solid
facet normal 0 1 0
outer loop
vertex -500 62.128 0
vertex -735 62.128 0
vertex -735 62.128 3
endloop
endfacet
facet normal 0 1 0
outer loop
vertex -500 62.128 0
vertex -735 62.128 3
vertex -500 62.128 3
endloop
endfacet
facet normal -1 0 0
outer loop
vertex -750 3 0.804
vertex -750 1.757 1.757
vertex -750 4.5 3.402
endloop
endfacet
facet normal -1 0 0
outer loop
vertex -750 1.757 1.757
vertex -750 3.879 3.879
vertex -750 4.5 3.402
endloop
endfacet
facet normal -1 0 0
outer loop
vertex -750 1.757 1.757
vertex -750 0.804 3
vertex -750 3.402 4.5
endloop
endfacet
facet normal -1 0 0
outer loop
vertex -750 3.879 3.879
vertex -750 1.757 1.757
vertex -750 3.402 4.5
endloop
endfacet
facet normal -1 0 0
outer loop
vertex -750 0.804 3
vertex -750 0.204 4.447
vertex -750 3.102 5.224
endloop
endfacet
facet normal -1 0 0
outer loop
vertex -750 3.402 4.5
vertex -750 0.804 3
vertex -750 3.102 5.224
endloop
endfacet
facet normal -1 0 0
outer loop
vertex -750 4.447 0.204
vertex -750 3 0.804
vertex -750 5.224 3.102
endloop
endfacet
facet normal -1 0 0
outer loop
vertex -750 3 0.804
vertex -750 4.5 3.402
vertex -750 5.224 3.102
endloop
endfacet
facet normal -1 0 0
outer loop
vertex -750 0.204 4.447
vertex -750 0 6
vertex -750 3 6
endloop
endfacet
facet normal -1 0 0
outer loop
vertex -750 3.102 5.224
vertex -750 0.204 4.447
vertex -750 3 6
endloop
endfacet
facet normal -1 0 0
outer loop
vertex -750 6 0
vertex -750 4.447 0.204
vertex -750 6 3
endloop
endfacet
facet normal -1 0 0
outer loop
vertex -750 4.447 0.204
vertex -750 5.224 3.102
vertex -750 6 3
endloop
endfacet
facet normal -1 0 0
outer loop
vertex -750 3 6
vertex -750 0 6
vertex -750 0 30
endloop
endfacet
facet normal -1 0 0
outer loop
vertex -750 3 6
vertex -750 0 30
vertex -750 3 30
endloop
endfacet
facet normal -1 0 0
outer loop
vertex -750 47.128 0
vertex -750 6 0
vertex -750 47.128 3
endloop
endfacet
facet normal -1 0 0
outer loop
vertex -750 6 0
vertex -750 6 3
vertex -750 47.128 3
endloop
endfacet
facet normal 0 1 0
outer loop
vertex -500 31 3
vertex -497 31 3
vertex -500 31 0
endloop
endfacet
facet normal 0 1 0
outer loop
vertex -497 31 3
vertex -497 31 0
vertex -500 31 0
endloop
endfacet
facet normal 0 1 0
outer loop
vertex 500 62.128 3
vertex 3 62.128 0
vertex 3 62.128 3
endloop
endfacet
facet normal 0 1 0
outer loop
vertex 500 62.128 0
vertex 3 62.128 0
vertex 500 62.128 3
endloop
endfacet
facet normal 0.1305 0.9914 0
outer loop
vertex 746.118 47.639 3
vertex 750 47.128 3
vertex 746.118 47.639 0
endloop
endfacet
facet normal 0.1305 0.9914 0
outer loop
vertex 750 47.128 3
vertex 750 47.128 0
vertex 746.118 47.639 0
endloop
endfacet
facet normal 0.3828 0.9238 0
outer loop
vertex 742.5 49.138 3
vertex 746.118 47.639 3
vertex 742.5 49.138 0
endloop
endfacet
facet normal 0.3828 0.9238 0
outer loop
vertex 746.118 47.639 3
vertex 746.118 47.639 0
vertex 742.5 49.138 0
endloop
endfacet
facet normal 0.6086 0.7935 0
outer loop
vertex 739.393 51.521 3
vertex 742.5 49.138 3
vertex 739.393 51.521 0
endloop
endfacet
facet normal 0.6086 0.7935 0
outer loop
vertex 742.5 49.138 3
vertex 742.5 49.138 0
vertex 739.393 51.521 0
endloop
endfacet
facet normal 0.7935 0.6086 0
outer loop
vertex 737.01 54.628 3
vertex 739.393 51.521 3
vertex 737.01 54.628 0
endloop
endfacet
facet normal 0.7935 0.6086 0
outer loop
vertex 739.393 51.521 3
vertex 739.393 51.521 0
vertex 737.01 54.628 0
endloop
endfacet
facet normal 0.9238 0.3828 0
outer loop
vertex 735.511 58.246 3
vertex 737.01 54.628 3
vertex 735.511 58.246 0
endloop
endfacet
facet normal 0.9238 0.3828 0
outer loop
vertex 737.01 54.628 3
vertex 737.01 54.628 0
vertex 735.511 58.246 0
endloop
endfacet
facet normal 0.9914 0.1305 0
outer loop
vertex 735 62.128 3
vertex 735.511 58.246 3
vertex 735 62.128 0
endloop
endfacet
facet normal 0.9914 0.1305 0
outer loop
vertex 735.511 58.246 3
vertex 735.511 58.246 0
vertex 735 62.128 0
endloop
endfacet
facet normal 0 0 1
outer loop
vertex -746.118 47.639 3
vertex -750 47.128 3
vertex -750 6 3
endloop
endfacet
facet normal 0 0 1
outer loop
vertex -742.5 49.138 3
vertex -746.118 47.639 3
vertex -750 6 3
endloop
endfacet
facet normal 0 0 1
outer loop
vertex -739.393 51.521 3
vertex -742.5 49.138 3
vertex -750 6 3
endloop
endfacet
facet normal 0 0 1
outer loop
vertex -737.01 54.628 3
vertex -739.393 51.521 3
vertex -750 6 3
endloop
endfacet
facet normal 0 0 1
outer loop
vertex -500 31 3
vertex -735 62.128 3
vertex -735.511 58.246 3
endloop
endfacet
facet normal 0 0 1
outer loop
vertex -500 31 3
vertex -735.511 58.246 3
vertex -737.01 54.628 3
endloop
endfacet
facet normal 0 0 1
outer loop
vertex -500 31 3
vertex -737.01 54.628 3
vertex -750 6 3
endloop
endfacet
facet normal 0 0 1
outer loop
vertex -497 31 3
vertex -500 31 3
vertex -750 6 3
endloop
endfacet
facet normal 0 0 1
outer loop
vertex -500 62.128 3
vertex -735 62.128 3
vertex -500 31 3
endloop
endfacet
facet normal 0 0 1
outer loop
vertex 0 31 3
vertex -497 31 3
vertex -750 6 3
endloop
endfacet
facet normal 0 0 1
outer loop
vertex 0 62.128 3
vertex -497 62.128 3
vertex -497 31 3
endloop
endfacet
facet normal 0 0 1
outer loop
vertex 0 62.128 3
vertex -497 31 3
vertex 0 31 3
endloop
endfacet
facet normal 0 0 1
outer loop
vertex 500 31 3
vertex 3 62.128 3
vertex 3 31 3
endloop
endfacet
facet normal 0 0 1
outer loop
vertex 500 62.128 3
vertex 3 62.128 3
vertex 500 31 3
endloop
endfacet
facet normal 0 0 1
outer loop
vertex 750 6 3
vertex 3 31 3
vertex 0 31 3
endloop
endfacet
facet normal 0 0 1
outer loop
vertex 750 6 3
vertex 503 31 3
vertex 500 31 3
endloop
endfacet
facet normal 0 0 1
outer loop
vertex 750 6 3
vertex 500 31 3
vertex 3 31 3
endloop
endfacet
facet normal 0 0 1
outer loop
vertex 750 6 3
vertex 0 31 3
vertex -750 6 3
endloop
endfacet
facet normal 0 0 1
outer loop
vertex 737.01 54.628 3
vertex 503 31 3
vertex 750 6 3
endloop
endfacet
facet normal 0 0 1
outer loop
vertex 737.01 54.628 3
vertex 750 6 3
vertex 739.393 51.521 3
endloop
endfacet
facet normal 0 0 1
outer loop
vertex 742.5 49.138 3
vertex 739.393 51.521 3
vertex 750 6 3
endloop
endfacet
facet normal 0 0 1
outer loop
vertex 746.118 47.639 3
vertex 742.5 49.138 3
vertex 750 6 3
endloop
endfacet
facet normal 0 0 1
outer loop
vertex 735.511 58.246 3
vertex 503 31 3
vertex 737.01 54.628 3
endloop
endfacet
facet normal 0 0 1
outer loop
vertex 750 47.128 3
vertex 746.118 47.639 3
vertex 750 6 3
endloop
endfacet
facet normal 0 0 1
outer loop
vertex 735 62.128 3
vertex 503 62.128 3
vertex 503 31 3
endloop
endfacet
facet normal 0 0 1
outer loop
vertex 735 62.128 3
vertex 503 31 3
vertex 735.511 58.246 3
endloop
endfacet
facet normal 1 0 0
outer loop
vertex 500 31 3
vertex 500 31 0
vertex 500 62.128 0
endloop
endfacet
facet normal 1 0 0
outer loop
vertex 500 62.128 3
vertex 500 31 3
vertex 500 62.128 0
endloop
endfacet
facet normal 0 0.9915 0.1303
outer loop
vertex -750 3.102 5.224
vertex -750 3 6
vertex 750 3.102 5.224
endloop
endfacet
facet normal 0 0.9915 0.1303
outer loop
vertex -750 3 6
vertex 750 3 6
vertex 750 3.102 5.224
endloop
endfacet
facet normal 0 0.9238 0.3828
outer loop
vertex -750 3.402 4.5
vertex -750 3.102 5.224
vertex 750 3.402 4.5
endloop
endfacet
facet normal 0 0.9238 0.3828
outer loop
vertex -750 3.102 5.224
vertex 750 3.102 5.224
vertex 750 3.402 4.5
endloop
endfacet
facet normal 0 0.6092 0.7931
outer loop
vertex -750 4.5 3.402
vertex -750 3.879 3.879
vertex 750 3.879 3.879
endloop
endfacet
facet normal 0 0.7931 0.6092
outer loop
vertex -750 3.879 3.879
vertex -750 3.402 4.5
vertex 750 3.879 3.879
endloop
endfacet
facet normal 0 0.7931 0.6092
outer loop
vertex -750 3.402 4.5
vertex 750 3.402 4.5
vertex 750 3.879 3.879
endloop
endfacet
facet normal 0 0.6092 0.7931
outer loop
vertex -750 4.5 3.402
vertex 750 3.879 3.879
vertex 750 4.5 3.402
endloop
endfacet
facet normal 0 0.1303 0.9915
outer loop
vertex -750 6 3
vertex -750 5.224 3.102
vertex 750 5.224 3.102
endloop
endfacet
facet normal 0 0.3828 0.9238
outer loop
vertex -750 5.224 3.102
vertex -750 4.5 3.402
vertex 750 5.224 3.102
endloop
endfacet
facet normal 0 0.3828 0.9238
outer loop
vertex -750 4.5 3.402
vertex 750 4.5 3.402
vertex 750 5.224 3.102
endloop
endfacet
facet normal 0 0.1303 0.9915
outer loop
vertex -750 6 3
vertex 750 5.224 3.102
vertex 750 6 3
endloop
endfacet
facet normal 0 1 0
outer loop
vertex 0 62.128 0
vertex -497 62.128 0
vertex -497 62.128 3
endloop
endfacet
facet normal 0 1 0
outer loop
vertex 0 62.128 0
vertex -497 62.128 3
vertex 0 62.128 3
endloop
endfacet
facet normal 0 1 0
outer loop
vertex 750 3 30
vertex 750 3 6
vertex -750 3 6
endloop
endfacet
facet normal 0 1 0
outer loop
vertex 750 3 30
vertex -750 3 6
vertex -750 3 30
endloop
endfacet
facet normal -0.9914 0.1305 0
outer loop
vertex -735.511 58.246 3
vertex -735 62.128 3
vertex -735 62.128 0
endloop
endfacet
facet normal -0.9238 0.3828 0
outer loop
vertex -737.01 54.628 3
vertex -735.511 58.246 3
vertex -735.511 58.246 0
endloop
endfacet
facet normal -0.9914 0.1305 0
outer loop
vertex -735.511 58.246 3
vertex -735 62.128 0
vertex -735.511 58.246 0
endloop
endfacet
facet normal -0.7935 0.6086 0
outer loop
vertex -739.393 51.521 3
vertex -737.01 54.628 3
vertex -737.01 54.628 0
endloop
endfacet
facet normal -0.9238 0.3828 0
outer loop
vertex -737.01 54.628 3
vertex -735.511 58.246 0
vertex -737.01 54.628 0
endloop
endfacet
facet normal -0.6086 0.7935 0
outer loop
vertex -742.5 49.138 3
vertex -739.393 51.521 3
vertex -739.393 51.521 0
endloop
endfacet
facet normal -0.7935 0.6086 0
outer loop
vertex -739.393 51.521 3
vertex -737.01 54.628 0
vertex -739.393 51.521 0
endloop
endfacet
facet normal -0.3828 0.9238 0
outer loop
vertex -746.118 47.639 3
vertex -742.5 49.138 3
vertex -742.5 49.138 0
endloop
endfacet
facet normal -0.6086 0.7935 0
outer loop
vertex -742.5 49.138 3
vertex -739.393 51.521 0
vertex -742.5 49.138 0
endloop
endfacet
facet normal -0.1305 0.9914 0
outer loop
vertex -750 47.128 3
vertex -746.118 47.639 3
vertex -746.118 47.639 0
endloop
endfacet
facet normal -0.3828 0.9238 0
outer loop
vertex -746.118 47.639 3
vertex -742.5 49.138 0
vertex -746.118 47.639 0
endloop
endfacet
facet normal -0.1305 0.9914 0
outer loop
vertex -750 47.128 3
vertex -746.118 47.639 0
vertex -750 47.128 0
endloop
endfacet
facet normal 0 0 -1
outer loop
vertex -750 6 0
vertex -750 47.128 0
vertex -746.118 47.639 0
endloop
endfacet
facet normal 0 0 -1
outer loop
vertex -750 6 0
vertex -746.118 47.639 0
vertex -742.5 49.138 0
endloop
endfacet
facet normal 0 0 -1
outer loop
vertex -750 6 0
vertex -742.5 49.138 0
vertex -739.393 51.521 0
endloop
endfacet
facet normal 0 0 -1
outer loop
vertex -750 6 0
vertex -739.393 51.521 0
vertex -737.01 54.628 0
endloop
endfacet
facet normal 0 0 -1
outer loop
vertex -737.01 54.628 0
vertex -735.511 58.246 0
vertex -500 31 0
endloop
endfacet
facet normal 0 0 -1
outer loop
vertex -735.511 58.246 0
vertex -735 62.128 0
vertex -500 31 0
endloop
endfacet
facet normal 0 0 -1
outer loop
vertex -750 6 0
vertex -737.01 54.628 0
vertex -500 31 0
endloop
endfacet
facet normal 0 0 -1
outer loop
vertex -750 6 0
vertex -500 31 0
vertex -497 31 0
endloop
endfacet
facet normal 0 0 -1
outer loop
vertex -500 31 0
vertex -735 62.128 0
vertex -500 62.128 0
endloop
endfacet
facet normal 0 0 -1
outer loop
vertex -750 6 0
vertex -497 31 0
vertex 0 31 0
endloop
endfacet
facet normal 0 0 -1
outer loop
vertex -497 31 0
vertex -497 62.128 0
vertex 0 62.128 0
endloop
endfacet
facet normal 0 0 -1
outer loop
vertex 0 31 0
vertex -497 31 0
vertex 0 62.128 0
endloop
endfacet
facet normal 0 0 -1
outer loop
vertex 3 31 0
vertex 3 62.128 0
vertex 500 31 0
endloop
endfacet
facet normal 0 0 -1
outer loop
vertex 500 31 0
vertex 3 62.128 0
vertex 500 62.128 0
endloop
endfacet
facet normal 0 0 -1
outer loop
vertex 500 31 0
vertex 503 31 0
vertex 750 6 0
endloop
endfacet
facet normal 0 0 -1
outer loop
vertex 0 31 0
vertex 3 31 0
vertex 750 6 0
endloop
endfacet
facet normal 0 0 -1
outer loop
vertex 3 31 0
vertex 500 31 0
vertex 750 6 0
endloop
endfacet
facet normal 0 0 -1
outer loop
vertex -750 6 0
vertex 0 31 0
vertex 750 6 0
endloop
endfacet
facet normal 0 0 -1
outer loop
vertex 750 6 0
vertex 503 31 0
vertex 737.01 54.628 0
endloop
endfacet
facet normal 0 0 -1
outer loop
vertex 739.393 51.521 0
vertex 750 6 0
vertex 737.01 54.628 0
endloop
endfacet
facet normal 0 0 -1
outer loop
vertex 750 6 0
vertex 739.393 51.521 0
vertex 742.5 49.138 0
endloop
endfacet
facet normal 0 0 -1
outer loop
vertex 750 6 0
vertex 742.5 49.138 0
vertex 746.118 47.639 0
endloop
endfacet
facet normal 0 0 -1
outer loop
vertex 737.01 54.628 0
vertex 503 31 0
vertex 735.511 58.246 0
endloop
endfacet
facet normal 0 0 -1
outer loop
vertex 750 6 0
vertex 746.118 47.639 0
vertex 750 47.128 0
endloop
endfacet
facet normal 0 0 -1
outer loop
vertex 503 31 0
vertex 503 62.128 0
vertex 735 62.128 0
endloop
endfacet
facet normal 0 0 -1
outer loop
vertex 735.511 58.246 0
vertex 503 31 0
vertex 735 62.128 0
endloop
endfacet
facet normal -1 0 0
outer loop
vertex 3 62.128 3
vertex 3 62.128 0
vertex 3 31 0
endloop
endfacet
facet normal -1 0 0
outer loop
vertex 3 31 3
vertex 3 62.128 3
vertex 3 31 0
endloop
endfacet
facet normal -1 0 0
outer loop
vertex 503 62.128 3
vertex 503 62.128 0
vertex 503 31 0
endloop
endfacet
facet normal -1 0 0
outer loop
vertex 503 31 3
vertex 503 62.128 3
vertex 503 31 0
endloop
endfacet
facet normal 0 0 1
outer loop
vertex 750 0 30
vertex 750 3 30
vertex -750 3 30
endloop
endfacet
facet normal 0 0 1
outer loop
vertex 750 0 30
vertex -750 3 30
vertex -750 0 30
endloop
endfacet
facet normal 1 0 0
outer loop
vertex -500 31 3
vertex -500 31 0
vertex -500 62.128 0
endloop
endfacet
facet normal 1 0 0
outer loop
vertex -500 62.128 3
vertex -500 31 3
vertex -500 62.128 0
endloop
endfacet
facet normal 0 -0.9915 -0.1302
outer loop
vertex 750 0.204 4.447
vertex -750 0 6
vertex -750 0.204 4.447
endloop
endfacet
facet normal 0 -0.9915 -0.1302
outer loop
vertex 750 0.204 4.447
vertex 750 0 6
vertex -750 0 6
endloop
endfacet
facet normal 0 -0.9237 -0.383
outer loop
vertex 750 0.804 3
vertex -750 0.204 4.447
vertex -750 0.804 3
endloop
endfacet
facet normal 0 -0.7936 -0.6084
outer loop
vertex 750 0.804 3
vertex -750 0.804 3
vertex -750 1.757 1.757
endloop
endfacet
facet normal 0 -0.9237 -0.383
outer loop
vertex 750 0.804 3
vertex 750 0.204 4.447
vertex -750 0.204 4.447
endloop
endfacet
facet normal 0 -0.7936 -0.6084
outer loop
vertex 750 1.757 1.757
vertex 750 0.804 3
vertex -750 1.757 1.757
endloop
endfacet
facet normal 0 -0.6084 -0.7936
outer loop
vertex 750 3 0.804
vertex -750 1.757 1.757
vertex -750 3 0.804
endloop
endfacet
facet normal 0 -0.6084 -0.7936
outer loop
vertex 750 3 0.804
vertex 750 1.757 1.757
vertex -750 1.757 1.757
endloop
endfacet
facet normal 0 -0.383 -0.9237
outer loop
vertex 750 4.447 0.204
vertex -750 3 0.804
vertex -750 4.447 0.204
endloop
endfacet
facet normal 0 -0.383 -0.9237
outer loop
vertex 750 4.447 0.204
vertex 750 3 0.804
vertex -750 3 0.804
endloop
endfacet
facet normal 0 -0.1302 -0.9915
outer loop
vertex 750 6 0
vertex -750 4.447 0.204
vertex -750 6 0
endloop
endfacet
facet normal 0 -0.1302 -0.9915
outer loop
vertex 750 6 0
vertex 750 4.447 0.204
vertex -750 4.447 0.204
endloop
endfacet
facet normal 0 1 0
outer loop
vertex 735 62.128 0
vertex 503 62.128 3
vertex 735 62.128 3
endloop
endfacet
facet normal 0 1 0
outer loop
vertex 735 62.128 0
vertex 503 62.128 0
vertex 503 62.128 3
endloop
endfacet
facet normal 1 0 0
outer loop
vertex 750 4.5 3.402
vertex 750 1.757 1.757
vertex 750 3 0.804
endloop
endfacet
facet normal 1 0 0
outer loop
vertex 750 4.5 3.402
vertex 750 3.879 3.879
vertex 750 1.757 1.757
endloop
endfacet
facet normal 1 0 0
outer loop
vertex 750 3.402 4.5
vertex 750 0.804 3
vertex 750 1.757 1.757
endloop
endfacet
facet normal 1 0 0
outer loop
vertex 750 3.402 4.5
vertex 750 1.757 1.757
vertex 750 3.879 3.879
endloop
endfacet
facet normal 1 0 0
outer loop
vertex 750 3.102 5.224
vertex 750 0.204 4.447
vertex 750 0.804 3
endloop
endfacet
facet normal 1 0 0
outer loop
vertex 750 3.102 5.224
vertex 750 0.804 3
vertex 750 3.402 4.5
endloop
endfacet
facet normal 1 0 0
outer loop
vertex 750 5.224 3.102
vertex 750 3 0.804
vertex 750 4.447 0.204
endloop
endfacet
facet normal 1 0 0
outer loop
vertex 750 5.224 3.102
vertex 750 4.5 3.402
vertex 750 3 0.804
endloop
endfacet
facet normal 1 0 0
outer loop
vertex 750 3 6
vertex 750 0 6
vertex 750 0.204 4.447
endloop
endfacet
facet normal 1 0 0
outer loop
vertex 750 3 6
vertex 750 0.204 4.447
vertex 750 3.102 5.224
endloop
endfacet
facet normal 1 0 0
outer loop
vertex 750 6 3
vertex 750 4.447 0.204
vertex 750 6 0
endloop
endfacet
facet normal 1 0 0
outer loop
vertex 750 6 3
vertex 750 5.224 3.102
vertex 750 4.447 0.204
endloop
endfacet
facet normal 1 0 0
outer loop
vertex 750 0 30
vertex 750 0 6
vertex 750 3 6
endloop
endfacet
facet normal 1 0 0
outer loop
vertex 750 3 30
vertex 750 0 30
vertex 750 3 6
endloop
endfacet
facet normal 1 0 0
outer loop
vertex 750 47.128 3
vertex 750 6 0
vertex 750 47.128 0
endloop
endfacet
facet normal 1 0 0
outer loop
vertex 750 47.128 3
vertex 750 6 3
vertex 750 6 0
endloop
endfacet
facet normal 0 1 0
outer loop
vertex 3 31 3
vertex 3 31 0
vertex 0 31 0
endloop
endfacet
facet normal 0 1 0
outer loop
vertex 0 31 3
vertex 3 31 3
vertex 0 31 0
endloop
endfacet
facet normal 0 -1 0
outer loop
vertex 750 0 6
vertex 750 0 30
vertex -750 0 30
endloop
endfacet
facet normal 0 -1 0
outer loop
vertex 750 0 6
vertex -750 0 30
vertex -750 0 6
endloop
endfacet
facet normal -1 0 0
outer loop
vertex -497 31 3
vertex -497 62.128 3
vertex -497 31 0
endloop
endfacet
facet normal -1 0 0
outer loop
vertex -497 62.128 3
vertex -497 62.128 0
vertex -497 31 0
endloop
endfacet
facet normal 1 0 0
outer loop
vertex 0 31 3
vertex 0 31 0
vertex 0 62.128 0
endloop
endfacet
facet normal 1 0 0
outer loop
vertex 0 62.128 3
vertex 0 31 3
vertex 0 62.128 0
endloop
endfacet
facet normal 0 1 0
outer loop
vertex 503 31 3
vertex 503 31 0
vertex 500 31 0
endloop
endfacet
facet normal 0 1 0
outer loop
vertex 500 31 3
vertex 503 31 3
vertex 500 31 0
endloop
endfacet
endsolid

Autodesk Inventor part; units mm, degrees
ref_plane "YZ Plane" through (0, 0, 0) normal (1, 0, 0) x (0, 1, 0)
ref_plane "XZ Plane" through (0, 0, 0) normal (0, 1, 0) x (-1, 0, 0)
ref_plane "XY Plane" through (0, 0, 0) normal (0, 0, 1) x (1, 0, 0)
sketch "Sketch1" plane through (0, 0, 0) normal (0, 0, 1) x (1, 0, 0)
  line L0 (-750, 62.1281) -> (750, 62.1281)
  line L1 (750, 62.1281) -> (750, 0)
  line L2 (750, 0) -> (-750, 0)
  line L3 (-750, 0) -> (-750, 62.1281)
  point P0 (0, 0)
  point P1 (0, 0)
  dimension "d0" = 1500
  dimension "d1" = 62.1281
extrude "Plate1" add sketch "Sketch1" along normal blind 3
sketch "Sketch2" plane through (750, 3, 0) normal (0, -1, 0) x (1, 0, 0)
  line L0 (-1500, 0) -> (0, 0)
  line L1 (0, 0) -> (0, 30)
  line L2 (0, 30) -> (-1500, 30)
  line L3 (-1500, 30) -> (-1500, 0)
edge flange "Flange1" height 30 angle 90 thickness 3 bend radius 3 thickness toward (0, -1, 0) relief tear relief width 3 relief depth 1.5 edges at (0, 0, 3) wall of the first edge with corners at (-750, 3, 0) (750, 3, 0) (750, 3, 30) (-750, 3, 30)
bend "Bend1"
corner "Corner1"
sketch "Sketch5" plane through (0, 0, 0) normal (0, 0, -1) x (-1, 0, 0)
  line L0 (750, 62.1281) -> (-750, 62.1281) projected
  line L1 (497, 62.1281) -> (497, 31)
  line L2 (497, 31) -> (500, 31)
  line L3 (500, 31) -> (500, 62.1281)
  line L4 (750, 0) -> (-750, 0) projected
  point P0 (0, 0)
  dimension "d18" = 3
  dimension "d19" = 250
  dimension "d20" = 31
extrude "Extrusion1" cut sketch "Sketch5" against normal through all
pattern_linear "Rectangular Pattern1" count 3 spacing 500 along (1, 0, 0) of "Extrusion1"
sketch "Sketch6" plane through (0, 0, 0) normal (0, 0, -1) x (-1, 0, 0)
  line L0 (-750, 62.1281) -> (-750, 6) projected
  circle A0 centre (-750, 62.1281) radius 15
  line L1 (-750, 62.1281) -> (-503, 62.1281) projected
  point P0 (0, 0)
  point P1 (-735, 62.1281)
  point P2 (-750, 47.1281)
  dimension "d24" = 30
extrude "Extrusion2" cut sketch "Sketch6" against normal through all contours L1 A0 L0 picked at (-740.1254, 61.0155)
mirror "Mirror1" about plane through (0, 0, 0) normal (1, 0, 0) of "Extrusion2"
equation "\"d1\" = Стрингер_2"
equation "\"d18\" = Thickness"
equation "\"d2\" = Thickness"
equation "\"d3\" = BendReliefWidth"
equation "\"d4\" = BendReliefDepth"
equation "\"d5\" = MinimumRemnant"
equation "\"d6\" = TransitionRadius"
equation "\"d9\" = BendRadius"
equation "\"d10\" = CornerReliefSize"
equation "\"d11\" = GapSize"
equation "\"d12\" = JacobiRadiusSize"
equation "\"BendRadius\" = Thickness"
equation "\"BendReliefWidth\" = Thickness"
equation "\"BendReliefDepth\" = 0.5 * Thickness"
equation "\"CornerReliefSize\" = 4 * Thickness"
equation "\"MinimumRemnant\" = 2 * Thickness"
equation "\"TransitionRadius\" = BendRadius"
equation "\"JacobiRadiusSize\" = BendRadius"
equation "\"GapSize\" = Thickness"
equation "\"qqqqqq\" = 67.35706"
equation "\"Стрингер_2\" = 62.128061"
equation "\"Thickness\" = 3"
properties part number "МОО 052 стрингер спина 2"
